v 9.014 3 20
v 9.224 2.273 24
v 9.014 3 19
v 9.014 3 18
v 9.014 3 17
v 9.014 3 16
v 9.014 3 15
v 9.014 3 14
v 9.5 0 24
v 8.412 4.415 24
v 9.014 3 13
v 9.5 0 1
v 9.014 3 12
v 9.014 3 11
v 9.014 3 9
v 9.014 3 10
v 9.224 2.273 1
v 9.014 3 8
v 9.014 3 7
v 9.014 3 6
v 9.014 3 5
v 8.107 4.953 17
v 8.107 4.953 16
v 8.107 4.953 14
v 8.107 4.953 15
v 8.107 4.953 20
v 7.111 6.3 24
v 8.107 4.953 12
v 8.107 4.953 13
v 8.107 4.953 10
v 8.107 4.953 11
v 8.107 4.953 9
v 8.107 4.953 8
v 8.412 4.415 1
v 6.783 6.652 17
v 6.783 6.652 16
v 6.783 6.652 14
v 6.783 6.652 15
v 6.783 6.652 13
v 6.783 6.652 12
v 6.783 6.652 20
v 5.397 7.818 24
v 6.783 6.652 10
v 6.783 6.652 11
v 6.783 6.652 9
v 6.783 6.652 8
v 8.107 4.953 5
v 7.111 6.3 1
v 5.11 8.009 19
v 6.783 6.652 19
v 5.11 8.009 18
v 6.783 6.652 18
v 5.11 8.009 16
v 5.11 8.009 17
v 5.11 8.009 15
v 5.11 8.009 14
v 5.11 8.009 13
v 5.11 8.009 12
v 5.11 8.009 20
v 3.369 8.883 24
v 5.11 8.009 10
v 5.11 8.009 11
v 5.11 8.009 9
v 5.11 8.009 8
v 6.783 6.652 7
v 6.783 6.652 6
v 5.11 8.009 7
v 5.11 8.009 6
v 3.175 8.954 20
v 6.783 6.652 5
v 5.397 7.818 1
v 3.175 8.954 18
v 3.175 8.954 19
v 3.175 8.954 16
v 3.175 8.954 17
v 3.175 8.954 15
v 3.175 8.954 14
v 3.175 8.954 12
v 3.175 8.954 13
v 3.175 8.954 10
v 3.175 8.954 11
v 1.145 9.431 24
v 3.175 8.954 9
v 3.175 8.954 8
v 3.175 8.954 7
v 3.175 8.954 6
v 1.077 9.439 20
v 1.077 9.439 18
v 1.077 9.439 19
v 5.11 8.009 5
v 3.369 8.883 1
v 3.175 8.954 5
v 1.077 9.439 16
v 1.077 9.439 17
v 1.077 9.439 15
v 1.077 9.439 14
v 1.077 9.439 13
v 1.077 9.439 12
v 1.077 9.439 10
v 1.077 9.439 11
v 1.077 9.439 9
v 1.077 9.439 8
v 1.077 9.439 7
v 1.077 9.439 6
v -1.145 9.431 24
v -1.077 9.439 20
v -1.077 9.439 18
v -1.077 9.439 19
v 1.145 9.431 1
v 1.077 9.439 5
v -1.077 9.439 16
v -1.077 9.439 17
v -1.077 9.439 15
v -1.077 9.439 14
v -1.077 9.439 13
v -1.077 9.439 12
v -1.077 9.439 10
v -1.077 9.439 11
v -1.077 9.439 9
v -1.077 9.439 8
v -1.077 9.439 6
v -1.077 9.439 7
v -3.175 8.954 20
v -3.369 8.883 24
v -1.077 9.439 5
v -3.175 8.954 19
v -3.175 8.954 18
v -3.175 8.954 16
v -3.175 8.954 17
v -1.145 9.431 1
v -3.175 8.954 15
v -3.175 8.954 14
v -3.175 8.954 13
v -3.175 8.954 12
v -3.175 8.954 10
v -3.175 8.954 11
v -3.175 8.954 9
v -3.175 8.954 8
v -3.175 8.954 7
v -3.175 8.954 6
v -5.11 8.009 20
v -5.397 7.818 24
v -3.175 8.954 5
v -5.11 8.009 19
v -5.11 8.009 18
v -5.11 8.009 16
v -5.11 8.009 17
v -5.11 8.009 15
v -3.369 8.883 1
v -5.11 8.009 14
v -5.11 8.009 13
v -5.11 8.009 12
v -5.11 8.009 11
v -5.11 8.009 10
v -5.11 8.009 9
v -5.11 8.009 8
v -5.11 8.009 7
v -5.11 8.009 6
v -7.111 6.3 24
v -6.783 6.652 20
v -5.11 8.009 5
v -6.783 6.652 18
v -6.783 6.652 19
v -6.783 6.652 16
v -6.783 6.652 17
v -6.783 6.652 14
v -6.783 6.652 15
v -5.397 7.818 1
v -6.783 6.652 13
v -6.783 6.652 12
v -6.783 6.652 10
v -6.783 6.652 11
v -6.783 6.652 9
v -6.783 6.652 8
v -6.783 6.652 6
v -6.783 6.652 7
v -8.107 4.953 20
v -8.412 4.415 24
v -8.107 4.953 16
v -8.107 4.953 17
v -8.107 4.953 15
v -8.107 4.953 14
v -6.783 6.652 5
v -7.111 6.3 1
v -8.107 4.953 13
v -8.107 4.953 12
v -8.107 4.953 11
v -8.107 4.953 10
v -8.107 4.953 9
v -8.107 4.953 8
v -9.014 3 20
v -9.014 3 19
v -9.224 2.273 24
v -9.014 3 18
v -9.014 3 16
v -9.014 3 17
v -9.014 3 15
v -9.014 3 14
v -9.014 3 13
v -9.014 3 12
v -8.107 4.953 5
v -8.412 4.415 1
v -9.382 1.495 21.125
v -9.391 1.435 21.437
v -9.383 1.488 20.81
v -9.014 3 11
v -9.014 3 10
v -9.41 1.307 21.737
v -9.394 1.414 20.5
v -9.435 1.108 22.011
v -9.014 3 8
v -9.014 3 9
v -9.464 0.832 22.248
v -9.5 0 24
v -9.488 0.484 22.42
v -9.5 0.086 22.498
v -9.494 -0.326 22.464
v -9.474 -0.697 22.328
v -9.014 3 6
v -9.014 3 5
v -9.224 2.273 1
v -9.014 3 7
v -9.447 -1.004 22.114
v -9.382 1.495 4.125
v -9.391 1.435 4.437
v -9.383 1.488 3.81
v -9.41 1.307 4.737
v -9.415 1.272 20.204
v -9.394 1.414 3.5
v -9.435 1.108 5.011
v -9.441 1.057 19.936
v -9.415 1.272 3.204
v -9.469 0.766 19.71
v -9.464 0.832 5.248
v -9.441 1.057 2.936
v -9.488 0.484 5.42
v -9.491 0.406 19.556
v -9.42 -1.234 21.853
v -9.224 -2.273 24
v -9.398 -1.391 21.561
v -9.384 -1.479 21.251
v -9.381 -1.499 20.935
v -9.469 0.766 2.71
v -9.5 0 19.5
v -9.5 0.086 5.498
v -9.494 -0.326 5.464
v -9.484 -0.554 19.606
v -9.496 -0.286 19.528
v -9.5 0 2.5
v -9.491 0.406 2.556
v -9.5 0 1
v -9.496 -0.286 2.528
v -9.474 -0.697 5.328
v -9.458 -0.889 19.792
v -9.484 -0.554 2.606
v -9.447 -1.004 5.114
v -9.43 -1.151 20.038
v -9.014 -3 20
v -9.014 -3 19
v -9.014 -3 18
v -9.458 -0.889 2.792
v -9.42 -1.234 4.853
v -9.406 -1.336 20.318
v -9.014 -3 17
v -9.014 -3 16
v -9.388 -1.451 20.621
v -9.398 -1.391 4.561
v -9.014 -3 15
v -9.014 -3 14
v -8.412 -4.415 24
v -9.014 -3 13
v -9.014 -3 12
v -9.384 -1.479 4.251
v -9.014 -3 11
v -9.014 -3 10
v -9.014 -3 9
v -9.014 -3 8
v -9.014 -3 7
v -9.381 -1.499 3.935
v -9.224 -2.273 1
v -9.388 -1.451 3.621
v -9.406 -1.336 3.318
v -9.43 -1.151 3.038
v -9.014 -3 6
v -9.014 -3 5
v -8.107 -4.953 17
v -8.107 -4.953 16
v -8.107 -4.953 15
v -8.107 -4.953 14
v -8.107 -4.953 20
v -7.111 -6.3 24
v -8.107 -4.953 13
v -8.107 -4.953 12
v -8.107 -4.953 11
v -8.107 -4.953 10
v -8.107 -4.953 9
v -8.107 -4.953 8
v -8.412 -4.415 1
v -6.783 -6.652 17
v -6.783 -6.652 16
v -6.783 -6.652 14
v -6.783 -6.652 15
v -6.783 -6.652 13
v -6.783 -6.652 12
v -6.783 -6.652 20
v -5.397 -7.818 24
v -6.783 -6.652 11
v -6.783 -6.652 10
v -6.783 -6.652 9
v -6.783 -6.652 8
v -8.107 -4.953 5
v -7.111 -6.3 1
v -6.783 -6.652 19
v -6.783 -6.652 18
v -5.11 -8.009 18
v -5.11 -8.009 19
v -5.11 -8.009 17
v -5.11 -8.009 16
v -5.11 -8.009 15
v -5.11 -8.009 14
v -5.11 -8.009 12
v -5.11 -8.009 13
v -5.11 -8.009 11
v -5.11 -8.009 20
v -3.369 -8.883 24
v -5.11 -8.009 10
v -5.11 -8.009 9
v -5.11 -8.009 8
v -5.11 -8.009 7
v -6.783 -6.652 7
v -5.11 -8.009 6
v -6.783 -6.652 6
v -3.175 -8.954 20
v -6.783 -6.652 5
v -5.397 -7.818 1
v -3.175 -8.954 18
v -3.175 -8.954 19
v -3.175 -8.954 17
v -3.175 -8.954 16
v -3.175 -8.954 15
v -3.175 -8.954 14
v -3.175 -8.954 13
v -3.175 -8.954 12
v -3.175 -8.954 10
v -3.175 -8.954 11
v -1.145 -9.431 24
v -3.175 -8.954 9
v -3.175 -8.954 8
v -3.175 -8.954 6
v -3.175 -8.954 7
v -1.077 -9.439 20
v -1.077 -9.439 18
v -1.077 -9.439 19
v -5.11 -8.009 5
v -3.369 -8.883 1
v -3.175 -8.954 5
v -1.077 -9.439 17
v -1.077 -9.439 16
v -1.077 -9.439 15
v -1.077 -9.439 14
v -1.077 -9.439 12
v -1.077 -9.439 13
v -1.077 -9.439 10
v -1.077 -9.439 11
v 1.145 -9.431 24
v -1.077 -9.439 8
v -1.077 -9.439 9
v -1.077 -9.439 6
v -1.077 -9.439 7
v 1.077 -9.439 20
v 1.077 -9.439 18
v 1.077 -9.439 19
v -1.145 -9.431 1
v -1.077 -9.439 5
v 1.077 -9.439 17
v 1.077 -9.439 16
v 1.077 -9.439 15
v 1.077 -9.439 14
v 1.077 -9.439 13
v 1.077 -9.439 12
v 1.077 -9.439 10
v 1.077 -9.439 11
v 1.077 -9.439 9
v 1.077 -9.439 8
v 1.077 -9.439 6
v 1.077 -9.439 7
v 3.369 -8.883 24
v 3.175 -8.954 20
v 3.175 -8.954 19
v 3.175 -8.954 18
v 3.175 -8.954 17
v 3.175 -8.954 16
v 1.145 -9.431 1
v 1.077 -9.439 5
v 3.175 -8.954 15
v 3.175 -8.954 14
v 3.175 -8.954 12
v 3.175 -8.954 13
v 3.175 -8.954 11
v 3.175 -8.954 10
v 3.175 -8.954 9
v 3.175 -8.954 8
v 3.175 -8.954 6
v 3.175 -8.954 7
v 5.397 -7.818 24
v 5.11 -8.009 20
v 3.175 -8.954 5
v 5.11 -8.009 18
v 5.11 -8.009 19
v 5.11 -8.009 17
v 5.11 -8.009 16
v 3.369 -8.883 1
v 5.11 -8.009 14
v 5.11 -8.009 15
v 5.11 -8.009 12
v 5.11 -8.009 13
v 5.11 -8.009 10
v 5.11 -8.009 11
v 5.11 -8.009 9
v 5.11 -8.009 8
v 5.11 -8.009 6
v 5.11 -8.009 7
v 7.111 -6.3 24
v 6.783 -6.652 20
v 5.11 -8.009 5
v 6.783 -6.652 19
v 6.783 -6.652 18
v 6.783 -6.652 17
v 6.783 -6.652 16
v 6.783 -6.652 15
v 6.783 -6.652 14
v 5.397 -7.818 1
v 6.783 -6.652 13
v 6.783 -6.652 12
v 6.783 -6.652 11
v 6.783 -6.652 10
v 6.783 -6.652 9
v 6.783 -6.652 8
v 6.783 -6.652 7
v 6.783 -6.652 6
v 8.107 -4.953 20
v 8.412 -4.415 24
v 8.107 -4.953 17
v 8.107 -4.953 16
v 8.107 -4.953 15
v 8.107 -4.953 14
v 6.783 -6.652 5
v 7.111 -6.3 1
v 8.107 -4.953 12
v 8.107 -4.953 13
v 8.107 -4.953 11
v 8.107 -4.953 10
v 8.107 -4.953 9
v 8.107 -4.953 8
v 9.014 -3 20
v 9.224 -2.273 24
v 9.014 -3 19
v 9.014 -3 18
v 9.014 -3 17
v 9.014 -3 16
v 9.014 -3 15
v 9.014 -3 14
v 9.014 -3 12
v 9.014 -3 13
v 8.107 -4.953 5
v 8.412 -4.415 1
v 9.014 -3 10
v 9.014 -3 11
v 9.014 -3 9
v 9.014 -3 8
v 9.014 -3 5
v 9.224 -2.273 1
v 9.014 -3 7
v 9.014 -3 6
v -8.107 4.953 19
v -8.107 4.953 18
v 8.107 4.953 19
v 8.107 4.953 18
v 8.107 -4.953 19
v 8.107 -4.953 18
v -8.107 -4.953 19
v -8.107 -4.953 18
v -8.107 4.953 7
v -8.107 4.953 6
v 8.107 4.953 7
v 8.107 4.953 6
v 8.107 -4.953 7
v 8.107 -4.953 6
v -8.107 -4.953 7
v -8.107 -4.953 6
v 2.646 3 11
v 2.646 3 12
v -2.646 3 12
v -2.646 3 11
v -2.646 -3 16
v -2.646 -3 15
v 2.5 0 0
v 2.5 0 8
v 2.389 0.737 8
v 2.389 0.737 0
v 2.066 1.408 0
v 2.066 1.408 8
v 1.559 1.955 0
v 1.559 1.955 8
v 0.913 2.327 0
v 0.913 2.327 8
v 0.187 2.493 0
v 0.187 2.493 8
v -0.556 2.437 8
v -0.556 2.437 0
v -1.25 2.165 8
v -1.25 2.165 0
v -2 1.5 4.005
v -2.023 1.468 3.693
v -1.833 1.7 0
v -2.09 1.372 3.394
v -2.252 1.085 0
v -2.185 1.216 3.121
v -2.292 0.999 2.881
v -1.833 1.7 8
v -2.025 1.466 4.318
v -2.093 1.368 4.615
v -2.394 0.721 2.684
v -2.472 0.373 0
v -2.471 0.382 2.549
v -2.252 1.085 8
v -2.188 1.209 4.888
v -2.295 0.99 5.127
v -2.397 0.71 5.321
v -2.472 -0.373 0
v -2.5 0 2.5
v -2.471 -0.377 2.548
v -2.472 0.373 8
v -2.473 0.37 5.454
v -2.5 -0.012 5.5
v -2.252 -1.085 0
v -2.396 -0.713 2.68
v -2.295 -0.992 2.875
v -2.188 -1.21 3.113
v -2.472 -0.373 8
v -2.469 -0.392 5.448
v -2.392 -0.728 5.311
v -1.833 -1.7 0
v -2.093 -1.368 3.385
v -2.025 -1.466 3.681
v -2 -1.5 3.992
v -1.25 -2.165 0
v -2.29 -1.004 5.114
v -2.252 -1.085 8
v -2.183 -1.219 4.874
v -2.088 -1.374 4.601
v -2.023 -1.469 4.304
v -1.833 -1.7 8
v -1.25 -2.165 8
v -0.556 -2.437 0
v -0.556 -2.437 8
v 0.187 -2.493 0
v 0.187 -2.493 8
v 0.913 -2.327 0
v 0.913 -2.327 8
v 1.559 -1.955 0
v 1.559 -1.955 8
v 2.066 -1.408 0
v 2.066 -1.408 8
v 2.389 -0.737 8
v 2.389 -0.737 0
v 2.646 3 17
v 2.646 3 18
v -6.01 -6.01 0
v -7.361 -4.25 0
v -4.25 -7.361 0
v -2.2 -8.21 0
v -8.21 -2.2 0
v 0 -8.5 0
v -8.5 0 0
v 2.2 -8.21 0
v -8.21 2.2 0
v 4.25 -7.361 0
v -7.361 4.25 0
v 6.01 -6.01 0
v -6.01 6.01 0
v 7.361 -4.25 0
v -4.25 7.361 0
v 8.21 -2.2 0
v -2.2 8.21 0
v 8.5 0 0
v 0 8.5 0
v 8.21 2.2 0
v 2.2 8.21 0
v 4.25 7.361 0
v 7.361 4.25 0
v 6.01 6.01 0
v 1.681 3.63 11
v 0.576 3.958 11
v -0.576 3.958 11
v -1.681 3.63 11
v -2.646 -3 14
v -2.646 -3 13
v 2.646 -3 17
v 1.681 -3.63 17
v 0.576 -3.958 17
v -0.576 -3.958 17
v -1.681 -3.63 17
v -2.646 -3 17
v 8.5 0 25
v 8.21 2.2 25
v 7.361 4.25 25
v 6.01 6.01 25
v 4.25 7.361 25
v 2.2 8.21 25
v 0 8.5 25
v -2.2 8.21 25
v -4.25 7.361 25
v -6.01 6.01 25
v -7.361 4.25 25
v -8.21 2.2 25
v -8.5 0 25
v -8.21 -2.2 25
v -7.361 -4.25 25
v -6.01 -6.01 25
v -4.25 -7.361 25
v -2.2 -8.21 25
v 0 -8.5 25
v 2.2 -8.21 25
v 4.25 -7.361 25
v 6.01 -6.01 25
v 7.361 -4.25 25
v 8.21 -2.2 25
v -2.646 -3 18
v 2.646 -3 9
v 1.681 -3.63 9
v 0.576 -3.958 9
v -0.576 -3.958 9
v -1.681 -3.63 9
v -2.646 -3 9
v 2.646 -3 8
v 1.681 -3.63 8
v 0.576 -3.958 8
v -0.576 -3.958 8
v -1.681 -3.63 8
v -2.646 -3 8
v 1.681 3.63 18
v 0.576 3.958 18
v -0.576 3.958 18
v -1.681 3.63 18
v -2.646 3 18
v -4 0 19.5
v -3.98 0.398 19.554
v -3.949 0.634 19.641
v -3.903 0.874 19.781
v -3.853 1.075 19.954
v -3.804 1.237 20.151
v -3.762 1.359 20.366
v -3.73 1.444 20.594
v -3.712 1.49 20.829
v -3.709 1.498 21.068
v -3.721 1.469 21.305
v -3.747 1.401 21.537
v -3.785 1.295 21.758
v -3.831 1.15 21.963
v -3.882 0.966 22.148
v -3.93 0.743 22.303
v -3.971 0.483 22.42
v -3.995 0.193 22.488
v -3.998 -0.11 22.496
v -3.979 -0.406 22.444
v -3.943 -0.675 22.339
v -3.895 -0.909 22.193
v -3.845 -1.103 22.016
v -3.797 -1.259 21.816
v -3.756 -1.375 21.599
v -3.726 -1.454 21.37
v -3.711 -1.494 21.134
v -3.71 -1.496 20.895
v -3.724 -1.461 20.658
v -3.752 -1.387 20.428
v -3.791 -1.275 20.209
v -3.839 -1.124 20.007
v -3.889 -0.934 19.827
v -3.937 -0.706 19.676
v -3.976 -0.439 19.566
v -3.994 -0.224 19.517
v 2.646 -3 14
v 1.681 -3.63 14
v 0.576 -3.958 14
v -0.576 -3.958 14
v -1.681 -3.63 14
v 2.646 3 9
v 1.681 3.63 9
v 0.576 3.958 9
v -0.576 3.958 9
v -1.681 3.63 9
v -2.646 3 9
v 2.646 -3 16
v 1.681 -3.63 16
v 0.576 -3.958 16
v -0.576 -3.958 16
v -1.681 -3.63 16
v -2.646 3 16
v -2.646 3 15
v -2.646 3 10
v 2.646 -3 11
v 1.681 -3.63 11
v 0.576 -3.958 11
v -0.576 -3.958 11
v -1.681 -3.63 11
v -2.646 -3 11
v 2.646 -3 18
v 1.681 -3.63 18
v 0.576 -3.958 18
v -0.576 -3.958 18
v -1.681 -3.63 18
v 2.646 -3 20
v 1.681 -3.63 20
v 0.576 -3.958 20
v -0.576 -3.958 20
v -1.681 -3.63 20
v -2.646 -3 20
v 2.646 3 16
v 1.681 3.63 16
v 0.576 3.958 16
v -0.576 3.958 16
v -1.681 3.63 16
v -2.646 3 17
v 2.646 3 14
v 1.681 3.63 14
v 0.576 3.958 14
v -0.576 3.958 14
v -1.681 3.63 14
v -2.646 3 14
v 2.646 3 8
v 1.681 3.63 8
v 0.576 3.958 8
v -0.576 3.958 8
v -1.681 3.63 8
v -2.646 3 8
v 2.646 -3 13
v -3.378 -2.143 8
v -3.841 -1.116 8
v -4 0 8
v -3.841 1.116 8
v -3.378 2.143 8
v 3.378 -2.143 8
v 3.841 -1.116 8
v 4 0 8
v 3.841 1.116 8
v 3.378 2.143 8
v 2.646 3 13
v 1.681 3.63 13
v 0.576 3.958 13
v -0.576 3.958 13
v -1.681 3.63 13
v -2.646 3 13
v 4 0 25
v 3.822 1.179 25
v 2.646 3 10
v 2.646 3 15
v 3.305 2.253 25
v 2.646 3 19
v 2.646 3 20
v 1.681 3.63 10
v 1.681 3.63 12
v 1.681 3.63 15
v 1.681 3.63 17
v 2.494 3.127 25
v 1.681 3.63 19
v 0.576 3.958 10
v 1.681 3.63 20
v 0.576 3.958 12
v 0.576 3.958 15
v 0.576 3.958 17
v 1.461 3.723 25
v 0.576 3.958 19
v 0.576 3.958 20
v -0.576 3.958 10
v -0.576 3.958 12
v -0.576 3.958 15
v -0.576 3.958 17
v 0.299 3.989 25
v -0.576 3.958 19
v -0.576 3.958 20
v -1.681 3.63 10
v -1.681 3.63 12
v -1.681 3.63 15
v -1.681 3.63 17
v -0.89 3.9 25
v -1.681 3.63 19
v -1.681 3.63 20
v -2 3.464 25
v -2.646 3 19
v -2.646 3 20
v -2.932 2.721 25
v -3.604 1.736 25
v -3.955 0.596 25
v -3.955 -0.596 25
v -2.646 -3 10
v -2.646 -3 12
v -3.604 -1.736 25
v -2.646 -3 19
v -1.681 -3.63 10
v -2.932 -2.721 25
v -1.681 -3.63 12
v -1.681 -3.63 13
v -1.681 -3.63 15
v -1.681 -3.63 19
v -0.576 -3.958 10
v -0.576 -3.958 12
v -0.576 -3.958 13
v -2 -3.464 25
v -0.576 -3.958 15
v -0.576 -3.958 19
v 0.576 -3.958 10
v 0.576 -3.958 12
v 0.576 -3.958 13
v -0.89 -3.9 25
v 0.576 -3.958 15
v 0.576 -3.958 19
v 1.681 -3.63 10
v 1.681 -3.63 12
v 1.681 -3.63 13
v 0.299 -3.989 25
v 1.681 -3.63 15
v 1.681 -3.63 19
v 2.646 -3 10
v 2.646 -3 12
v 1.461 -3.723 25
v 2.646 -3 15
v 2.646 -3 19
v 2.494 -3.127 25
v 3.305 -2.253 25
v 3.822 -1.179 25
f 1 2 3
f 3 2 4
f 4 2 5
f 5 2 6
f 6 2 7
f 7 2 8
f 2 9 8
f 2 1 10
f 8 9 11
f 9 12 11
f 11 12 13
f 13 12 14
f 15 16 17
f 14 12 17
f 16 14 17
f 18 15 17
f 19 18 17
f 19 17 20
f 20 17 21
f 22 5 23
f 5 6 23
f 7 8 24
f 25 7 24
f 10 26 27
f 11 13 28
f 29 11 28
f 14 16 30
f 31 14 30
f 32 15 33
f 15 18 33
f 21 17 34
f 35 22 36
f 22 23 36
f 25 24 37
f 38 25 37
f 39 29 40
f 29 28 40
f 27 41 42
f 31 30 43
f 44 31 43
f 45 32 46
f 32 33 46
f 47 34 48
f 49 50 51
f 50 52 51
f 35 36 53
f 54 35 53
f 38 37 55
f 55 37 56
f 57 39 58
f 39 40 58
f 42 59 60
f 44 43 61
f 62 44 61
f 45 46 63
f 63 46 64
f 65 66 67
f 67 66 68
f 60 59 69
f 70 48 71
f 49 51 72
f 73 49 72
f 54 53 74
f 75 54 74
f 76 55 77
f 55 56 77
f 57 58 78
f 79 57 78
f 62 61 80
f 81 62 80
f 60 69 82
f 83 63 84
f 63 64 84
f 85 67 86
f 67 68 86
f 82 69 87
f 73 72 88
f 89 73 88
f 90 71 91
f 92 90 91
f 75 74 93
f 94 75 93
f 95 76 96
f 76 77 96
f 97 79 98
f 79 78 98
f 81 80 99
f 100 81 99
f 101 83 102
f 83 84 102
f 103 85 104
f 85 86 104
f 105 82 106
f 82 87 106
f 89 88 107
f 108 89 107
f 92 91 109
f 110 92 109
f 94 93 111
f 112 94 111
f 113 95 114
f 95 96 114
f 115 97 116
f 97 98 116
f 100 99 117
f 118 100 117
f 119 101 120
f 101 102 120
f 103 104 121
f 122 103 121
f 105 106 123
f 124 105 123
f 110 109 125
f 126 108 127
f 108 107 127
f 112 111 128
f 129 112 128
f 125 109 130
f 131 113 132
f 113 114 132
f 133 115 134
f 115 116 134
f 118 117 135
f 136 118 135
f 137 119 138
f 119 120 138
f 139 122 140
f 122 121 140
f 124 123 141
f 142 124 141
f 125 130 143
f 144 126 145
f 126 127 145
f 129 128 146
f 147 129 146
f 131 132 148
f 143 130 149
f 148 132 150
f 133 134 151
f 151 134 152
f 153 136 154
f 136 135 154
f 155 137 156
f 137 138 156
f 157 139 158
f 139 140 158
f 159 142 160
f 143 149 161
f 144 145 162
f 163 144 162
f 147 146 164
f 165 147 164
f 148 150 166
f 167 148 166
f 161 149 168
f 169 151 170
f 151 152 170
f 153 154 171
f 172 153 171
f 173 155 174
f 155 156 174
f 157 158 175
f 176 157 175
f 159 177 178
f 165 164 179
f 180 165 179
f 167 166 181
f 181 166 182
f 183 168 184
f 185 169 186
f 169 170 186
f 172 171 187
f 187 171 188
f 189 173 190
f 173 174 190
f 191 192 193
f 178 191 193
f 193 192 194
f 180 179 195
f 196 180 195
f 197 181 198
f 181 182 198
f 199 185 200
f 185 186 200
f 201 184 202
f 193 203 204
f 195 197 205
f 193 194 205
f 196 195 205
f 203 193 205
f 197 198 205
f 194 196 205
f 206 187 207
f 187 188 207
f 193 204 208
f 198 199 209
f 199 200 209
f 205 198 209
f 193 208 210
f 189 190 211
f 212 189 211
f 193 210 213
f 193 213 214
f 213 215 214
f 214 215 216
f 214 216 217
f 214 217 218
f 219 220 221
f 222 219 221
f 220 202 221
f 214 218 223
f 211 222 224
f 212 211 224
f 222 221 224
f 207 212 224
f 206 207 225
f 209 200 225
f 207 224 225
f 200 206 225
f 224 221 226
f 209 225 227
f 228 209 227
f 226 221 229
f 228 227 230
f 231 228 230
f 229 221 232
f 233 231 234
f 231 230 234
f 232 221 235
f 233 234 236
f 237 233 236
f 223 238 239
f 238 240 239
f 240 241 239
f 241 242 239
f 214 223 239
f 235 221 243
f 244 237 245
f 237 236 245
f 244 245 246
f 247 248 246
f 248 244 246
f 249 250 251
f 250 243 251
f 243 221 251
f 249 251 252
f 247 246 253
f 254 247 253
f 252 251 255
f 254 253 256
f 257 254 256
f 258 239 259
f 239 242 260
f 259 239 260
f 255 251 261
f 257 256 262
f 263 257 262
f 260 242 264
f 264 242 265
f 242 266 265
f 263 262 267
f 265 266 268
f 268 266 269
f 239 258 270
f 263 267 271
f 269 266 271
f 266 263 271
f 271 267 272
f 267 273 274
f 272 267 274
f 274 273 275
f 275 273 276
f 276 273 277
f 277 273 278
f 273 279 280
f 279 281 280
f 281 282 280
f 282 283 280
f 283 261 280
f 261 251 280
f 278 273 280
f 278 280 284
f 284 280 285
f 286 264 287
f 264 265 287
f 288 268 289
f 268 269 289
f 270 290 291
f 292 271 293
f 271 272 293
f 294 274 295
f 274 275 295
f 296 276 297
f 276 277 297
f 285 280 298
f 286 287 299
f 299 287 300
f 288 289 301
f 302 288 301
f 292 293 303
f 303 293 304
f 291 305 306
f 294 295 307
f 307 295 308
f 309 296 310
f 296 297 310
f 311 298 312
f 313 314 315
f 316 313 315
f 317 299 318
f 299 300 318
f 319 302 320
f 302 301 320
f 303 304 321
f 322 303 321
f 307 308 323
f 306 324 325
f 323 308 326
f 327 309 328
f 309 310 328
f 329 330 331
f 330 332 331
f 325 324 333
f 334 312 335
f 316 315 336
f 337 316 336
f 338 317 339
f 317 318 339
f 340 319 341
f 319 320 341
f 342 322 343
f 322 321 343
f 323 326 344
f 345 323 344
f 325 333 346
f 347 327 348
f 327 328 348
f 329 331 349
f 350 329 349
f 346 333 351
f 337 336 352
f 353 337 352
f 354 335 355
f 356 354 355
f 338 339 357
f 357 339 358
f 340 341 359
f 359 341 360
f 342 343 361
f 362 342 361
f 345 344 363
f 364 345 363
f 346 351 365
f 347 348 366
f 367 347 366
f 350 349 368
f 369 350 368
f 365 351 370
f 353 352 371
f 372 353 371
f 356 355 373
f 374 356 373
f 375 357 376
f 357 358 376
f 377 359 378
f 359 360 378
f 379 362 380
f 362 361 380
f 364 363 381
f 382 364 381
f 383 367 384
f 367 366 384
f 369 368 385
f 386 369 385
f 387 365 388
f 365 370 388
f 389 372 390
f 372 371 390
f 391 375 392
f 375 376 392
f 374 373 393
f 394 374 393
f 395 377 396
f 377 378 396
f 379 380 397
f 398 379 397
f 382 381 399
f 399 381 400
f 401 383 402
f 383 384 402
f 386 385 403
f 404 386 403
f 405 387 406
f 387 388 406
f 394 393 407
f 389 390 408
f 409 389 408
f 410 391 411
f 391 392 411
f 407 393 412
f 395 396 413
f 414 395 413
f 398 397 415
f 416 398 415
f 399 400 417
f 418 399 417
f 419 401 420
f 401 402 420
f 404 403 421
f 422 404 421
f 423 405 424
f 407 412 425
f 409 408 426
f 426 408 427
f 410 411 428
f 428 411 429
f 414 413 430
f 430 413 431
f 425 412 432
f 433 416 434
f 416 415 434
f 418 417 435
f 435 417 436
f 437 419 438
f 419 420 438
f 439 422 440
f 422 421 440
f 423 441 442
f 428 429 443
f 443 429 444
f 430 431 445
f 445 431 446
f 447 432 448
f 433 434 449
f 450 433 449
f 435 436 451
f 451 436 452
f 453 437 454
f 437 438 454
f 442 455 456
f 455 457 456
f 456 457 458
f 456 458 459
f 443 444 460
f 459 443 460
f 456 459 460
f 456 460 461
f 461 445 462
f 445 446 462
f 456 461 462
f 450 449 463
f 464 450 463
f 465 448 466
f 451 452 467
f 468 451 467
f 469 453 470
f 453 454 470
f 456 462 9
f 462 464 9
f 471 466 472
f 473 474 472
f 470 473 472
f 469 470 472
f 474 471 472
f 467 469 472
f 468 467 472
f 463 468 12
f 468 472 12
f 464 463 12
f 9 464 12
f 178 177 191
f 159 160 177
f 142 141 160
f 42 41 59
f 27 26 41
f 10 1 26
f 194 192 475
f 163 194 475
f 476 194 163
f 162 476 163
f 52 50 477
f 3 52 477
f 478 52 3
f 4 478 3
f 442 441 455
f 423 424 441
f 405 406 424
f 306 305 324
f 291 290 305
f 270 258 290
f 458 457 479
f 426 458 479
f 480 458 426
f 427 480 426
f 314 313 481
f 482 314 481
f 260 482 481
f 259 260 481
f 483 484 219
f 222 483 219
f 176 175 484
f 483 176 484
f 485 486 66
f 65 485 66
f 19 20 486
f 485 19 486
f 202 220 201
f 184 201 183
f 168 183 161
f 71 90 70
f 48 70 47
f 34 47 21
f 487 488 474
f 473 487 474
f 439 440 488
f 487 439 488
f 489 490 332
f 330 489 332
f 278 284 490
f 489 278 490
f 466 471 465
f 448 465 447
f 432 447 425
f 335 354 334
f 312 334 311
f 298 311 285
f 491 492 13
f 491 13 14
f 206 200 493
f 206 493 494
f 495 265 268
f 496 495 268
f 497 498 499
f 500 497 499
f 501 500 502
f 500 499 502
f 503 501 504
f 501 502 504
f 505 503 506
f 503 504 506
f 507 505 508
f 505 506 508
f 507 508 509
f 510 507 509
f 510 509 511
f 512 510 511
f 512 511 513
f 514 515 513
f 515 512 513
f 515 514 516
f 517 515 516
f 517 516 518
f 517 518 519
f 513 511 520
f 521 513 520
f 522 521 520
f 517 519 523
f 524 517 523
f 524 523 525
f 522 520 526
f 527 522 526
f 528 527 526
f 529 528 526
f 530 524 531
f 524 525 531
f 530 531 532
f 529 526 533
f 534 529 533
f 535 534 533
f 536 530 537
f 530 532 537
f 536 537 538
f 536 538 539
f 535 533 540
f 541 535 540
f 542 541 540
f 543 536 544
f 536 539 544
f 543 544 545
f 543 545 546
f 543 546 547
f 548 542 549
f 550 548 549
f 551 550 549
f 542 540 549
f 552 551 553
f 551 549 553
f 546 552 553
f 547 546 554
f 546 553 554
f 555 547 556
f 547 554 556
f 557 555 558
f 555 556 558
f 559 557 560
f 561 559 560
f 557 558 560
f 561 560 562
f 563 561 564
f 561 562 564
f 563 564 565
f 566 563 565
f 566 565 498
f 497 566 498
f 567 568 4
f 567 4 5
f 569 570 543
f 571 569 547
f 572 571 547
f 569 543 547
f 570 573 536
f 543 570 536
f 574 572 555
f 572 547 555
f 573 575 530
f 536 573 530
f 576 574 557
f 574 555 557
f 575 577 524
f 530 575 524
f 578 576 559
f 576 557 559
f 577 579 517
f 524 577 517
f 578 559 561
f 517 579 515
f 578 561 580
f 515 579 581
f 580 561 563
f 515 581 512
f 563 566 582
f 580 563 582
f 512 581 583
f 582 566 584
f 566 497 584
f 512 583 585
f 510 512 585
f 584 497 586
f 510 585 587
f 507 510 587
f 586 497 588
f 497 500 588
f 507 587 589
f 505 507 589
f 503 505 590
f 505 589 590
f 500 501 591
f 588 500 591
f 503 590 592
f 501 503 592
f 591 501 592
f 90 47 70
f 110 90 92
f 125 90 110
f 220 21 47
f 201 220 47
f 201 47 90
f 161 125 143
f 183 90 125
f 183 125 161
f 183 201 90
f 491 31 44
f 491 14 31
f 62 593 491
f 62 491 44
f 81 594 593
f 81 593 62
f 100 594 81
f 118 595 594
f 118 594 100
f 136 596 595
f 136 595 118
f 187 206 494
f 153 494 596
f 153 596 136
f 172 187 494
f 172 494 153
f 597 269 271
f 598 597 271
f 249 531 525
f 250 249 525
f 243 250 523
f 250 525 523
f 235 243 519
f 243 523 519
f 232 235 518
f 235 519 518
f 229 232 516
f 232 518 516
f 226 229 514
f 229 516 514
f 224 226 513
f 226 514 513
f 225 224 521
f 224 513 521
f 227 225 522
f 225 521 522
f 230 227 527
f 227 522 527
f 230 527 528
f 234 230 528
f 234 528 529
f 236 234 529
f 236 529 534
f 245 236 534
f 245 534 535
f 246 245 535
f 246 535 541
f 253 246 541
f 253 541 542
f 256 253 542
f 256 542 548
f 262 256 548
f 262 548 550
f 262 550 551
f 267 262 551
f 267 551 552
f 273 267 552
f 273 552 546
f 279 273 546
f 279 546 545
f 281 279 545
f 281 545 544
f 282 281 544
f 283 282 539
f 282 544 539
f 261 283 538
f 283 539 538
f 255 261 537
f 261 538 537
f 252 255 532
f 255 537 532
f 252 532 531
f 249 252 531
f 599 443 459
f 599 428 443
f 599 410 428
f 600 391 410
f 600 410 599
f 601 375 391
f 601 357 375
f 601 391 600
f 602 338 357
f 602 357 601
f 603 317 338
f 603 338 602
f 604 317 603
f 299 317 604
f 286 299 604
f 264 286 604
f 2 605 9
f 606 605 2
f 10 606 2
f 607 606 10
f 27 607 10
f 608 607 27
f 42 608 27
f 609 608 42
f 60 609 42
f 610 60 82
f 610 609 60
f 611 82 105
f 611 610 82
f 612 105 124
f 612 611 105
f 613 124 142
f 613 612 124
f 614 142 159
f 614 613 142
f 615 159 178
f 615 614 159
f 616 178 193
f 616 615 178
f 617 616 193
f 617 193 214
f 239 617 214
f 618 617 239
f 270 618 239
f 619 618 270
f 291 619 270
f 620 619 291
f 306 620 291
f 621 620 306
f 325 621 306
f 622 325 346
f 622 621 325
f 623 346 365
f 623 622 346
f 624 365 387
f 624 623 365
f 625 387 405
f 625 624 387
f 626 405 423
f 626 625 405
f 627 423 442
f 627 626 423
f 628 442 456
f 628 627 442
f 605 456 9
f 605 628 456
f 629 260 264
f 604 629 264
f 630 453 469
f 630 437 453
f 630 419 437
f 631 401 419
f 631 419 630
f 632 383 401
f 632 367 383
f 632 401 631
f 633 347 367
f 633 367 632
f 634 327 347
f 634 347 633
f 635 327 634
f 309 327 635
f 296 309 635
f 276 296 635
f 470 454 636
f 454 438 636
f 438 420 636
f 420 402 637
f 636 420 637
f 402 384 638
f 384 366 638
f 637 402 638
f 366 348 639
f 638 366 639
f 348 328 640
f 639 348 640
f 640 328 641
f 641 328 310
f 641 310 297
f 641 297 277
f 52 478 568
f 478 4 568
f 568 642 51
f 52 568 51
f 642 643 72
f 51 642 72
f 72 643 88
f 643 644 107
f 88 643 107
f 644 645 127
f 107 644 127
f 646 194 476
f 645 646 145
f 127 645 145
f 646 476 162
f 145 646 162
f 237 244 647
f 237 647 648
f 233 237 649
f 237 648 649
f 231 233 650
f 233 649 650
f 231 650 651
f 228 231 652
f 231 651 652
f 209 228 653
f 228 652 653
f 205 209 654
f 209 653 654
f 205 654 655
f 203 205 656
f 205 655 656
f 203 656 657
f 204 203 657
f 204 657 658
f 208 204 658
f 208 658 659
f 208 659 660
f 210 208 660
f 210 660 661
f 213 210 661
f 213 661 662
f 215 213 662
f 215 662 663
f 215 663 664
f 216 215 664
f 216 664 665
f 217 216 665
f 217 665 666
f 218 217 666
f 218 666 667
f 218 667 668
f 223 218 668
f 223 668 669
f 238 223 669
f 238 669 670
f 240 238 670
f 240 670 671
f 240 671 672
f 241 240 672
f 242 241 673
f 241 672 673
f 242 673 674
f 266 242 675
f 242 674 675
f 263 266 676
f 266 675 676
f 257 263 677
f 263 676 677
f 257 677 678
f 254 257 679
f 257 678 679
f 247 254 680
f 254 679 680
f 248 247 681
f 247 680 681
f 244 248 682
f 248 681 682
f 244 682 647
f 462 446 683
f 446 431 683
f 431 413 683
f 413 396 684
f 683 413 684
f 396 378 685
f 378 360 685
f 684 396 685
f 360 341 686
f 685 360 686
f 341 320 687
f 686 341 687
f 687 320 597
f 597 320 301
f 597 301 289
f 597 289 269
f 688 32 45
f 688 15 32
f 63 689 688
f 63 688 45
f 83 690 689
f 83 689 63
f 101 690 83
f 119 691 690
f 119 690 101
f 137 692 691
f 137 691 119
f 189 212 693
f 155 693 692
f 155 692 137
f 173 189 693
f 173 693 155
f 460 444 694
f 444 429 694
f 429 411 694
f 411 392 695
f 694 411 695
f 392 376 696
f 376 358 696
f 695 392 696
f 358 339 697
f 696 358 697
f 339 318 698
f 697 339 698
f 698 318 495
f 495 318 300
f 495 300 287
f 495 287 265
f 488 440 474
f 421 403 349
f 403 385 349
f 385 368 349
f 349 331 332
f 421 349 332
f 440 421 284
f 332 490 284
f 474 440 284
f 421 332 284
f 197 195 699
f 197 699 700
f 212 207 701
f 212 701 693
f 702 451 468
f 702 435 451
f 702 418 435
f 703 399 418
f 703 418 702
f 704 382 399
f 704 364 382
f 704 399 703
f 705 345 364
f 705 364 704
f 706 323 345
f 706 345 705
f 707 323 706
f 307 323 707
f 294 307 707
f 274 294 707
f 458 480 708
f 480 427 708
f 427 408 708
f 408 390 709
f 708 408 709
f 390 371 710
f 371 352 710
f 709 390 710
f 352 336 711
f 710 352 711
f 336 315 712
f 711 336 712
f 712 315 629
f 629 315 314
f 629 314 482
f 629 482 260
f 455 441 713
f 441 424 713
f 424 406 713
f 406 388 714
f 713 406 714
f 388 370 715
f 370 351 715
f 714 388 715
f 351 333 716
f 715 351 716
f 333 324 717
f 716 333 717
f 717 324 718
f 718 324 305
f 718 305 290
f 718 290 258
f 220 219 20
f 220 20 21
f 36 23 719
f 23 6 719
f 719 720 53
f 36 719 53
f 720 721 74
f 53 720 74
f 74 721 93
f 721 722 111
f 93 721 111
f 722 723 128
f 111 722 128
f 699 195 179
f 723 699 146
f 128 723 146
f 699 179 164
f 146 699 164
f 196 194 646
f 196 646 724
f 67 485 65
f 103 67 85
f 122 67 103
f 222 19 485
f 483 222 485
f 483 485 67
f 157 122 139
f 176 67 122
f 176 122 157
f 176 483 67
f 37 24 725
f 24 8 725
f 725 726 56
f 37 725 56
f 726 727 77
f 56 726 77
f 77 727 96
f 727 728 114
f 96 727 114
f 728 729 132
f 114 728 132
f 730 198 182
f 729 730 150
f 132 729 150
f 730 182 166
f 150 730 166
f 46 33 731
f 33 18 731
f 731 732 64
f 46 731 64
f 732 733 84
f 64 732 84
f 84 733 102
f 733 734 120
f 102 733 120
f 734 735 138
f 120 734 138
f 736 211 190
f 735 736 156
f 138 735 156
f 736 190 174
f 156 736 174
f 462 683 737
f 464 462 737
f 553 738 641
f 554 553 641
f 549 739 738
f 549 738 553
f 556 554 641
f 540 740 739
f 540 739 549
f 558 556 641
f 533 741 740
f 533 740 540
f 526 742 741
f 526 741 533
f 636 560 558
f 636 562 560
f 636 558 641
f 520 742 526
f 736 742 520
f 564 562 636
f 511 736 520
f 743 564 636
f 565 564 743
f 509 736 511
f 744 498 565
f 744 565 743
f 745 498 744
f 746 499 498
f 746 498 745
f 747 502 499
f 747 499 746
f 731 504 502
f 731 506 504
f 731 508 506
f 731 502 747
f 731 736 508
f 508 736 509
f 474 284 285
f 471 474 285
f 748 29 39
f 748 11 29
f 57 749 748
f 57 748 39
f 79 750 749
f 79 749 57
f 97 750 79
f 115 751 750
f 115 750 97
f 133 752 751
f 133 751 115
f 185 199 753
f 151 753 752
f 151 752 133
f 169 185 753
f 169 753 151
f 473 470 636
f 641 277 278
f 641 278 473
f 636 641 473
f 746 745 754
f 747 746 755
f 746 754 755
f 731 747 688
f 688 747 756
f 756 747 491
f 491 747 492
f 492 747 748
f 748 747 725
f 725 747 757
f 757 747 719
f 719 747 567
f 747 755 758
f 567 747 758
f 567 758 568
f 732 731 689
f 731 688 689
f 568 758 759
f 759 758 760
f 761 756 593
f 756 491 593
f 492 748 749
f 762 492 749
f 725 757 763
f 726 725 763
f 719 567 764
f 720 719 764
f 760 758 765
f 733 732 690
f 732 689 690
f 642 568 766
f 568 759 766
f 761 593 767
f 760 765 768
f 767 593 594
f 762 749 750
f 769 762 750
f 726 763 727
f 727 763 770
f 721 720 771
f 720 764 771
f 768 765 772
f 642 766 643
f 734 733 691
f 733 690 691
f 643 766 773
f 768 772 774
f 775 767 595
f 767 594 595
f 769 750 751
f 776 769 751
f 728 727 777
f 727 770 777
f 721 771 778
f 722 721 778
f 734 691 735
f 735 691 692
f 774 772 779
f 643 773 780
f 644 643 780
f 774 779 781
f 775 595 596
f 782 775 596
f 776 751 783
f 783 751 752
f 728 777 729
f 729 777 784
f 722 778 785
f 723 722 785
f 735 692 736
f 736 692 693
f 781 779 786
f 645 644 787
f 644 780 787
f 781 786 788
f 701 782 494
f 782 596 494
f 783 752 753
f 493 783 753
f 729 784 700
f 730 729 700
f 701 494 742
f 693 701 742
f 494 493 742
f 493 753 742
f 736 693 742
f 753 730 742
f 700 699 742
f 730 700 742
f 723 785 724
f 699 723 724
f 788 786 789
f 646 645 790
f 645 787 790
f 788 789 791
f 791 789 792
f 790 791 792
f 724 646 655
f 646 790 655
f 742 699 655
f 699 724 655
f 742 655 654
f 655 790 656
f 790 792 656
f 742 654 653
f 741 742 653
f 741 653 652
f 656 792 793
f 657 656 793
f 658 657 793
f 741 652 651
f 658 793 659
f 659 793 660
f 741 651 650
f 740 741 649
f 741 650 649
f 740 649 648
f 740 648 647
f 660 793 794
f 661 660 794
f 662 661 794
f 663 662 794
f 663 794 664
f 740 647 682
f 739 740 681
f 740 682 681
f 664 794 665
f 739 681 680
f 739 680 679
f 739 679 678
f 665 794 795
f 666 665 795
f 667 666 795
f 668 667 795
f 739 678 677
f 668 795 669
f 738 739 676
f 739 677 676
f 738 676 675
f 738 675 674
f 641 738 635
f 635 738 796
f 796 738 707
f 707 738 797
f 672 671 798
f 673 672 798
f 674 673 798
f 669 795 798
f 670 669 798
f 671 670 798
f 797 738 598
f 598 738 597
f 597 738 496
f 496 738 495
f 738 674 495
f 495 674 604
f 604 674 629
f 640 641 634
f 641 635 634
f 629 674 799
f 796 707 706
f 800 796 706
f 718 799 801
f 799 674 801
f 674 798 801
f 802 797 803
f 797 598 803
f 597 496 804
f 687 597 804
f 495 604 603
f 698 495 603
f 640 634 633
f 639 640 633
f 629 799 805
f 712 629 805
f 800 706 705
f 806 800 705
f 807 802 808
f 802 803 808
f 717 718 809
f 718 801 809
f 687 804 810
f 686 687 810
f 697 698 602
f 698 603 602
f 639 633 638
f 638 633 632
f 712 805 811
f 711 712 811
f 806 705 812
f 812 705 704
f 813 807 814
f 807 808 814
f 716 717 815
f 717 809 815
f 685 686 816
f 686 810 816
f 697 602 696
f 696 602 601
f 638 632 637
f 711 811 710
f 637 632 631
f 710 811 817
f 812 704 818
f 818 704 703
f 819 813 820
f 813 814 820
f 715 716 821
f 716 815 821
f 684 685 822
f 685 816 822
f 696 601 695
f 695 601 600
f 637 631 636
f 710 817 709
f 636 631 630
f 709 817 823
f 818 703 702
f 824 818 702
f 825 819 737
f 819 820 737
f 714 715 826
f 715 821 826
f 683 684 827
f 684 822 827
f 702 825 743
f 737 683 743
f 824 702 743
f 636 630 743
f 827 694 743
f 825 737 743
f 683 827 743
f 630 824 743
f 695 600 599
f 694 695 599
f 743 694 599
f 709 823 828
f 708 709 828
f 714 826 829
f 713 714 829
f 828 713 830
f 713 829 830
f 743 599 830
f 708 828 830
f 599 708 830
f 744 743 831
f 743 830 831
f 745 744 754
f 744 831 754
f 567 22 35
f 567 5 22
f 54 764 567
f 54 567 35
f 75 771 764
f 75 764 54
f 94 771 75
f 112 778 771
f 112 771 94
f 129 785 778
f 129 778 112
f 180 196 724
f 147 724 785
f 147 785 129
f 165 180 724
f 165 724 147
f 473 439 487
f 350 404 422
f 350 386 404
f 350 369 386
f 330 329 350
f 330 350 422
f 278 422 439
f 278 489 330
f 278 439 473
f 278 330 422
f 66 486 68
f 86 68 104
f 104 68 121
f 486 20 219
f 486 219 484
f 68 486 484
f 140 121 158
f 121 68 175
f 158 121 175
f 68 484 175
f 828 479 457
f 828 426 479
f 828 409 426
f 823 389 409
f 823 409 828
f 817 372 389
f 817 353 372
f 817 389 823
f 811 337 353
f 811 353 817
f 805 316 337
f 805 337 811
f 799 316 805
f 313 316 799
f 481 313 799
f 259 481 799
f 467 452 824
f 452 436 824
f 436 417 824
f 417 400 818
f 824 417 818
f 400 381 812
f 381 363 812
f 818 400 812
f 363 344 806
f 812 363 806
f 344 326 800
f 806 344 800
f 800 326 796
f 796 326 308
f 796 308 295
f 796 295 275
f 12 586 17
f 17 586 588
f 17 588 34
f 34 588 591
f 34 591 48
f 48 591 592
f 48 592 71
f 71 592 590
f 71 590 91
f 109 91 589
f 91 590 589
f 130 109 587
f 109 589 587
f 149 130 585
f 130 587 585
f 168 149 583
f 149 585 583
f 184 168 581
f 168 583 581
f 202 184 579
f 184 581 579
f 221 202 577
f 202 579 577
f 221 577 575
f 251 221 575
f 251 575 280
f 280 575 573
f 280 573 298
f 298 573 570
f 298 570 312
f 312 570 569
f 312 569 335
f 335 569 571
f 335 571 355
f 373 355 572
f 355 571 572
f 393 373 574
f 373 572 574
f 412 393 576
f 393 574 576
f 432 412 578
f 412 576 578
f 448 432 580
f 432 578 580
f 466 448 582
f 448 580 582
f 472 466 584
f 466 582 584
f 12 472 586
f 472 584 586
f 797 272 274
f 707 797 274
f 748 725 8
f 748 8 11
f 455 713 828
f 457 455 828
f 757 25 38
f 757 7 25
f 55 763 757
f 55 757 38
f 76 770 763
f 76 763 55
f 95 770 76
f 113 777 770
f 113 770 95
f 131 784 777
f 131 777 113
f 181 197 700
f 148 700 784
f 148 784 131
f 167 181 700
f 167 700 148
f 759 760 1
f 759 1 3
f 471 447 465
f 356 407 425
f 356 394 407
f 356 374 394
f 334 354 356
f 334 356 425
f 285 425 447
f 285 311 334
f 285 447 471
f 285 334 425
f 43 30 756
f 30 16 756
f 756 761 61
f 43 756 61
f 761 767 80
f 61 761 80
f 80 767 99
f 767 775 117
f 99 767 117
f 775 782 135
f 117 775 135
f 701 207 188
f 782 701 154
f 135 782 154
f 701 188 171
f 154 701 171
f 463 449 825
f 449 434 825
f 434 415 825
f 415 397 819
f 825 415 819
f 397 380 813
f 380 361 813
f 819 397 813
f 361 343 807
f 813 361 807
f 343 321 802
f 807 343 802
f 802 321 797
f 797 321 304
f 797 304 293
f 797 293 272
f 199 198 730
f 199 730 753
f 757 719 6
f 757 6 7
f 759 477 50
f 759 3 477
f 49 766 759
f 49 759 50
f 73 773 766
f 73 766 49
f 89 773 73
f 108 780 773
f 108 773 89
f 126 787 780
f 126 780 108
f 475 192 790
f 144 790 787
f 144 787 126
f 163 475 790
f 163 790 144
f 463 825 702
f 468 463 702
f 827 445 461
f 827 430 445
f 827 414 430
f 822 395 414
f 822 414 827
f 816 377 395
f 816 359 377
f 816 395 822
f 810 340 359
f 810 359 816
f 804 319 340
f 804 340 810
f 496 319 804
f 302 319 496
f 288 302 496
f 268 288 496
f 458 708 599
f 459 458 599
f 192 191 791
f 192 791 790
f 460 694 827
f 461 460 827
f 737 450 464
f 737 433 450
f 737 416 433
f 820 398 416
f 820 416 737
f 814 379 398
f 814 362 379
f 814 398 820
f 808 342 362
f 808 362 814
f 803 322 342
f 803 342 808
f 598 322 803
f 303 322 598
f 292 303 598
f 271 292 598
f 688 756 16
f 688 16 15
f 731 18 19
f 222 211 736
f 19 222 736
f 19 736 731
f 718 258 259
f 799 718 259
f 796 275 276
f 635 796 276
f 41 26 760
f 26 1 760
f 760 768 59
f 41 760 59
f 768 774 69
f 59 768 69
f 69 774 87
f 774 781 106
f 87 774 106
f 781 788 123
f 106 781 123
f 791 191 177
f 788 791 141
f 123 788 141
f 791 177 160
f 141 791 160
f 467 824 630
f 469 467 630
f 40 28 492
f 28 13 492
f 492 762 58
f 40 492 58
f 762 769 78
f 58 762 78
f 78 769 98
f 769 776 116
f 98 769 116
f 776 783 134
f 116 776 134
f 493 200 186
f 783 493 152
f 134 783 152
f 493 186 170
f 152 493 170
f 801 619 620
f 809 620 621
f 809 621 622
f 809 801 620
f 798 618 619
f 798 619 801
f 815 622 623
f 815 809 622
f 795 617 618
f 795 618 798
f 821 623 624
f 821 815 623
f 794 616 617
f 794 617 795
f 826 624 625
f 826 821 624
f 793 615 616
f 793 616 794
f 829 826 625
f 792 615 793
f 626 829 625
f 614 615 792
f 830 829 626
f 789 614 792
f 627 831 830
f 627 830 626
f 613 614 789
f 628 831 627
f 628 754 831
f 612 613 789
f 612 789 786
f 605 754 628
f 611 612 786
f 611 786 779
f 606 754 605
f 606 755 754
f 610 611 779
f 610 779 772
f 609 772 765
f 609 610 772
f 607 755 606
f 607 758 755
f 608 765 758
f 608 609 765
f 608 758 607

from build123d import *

# Parameters (mm, degrees)
CROQUIS1_R                 = 9.5
SALIENTE_EXTRUIR1_DEPTH    = 25
CROQUIS2_R                 = 2.5
CORTAR_EXTRUIR1_DEPTH      = 29.381331893
CROQUIS3_R                 = 4
CORTAR_EXTRUIR2_DEPTH      = 17
CHAFL_N1_SIZE              = 1
CROQUIS4_R                 = 1.5
CORTAR_EXTRUIR3_DEPTH      = 29.381331893
CORTAR_EXTRUIR4_DEPTH      = 29.381332048
CORTAR_EXTRUIR4_DEPTH_BACK = 29.381332048
CROQUIS5_W                 = 1
CROQUIS5_H                 = 8


with BuildPart() as part:
    # Croquis1 → Saliente-Extruir1 (new body)
    with BuildSketch(Plane.XY):
        Circle(CROQUIS1_R)
    extrude(amount=SALIENTE_EXTRUIR1_DEPTH)

    # Croquis2 → Cortar-Extruir1 (cut, through all)
    with BuildSketch(Plane.XY.offset(25)):
        Circle(CROQUIS2_R)
    extrude(amount=-CORTAR_EXTRUIR1_DEPTH, mode=Mode.SUBTRACT)

    # Croquis3 → Cortar-Extruir2 (cut)
    with BuildSketch(Plane.XY.offset(25)):
        Circle(CROQUIS3_R)
    extrude(amount=-CORTAR_EXTRUIR2_DEPTH, mode=Mode.SUBTRACT)

    # Chaflán1
    chafl_n1_edges = [part.edges().sort_by_distance(p)[0] for p in [
        (-9.5, 0, 0),
        (-9.5, 0, 25),
    ]]
    chamfer(chafl_n1_edges, length=CHAFL_N1_SIZE)

    # Croquis4 → Cortar-Extruir3 (cut, through all)
    with BuildSketch(Plane(origin=(0, 0, 0), x_dir=(0, 0, -1), z_dir=(1, 0, 0))):
        with Locations((-21, 0)):
            Circle(CROQUIS4_R)
        with Locations((-4, 0)):
            Circle(CROQUIS4_R)
    extrude(amount=-CORTAR_EXTRUIR3_DEPTH, mode=Mode.SUBTRACT)

    # Croquis5 → Cortar-Extruir4 (cut, two sides: drawn at the far end of the back side and taken through both)
    with BuildSketch(Plane(origin=(0, 0, 0), x_dir=(0, 0, -1), z_dir=(1, 0, 0)).offset(-CORTAR_EXTRUIR4_DEPTH_BACK)):
        with Locations((-17.5, 7)):
            Rectangle(CROQUIS5_W, CROQUIS5_H)
        with Locations((-19.5, 7)):
            Rectangle(CROQUIS5_W, CROQUIS5_H)
        with Locations((-15.5, 7)):
            Rectangle(CROQUIS5_W, CROQUIS5_H)
        with Locations((-13.5, 7)):
            Rectangle(CROQUIS5_W, CROQUIS5_H)
        with Locations((-11.5, 7)):
            Rectangle(CROQUIS5_W, CROQUIS5_H)
        with Locations((-9.5, 7)):
            Rectangle(CROQUIS5_W, CROQUIS5_H)
        with Locations((-7.5, 7)):
            Rectangle(CROQUIS5_W, CROQUIS5_H)
        with Locations((-5.5, 7)):
            Rectangle(CROQUIS5_W, CROQUIS5_H)
        with Locations((-17.5, -7)):
            Rectangle(CROQUIS5_W, CROQUIS5_H)
        with Locations((-15.5, -7)):
            Rectangle(CROQUIS5_W, CROQUIS5_H)
        with Locations((-13.5, -7)):
            Rectangle(CROQUIS5_W, CROQUIS5_H)
        with Locations((-11.5, -7)):
            Rectangle(CROQUIS5_W, CROQUIS5_H)
        with Locations((-9.5, -7)):
            Rectangle(CROQUIS5_W, CROQUIS5_H)
        with Locations((-7.5, -7)):
            Rectangle(CROQUIS5_W, CROQUIS5_H)
        with Locations((-5.5, -7)):
            Rectangle(CROQUIS5_W, CROQUIS5_H)
        with Locations((-19.5, -7)):
            Rectangle(CROQUIS5_W, CROQUIS5_H)
    extrude(amount=CORTAR_EXTRUIR4_DEPTH + CORTAR_EXTRUIR4_DEPTH_BACK, mode=Mode.SUBTRACT)


solid = part.part
